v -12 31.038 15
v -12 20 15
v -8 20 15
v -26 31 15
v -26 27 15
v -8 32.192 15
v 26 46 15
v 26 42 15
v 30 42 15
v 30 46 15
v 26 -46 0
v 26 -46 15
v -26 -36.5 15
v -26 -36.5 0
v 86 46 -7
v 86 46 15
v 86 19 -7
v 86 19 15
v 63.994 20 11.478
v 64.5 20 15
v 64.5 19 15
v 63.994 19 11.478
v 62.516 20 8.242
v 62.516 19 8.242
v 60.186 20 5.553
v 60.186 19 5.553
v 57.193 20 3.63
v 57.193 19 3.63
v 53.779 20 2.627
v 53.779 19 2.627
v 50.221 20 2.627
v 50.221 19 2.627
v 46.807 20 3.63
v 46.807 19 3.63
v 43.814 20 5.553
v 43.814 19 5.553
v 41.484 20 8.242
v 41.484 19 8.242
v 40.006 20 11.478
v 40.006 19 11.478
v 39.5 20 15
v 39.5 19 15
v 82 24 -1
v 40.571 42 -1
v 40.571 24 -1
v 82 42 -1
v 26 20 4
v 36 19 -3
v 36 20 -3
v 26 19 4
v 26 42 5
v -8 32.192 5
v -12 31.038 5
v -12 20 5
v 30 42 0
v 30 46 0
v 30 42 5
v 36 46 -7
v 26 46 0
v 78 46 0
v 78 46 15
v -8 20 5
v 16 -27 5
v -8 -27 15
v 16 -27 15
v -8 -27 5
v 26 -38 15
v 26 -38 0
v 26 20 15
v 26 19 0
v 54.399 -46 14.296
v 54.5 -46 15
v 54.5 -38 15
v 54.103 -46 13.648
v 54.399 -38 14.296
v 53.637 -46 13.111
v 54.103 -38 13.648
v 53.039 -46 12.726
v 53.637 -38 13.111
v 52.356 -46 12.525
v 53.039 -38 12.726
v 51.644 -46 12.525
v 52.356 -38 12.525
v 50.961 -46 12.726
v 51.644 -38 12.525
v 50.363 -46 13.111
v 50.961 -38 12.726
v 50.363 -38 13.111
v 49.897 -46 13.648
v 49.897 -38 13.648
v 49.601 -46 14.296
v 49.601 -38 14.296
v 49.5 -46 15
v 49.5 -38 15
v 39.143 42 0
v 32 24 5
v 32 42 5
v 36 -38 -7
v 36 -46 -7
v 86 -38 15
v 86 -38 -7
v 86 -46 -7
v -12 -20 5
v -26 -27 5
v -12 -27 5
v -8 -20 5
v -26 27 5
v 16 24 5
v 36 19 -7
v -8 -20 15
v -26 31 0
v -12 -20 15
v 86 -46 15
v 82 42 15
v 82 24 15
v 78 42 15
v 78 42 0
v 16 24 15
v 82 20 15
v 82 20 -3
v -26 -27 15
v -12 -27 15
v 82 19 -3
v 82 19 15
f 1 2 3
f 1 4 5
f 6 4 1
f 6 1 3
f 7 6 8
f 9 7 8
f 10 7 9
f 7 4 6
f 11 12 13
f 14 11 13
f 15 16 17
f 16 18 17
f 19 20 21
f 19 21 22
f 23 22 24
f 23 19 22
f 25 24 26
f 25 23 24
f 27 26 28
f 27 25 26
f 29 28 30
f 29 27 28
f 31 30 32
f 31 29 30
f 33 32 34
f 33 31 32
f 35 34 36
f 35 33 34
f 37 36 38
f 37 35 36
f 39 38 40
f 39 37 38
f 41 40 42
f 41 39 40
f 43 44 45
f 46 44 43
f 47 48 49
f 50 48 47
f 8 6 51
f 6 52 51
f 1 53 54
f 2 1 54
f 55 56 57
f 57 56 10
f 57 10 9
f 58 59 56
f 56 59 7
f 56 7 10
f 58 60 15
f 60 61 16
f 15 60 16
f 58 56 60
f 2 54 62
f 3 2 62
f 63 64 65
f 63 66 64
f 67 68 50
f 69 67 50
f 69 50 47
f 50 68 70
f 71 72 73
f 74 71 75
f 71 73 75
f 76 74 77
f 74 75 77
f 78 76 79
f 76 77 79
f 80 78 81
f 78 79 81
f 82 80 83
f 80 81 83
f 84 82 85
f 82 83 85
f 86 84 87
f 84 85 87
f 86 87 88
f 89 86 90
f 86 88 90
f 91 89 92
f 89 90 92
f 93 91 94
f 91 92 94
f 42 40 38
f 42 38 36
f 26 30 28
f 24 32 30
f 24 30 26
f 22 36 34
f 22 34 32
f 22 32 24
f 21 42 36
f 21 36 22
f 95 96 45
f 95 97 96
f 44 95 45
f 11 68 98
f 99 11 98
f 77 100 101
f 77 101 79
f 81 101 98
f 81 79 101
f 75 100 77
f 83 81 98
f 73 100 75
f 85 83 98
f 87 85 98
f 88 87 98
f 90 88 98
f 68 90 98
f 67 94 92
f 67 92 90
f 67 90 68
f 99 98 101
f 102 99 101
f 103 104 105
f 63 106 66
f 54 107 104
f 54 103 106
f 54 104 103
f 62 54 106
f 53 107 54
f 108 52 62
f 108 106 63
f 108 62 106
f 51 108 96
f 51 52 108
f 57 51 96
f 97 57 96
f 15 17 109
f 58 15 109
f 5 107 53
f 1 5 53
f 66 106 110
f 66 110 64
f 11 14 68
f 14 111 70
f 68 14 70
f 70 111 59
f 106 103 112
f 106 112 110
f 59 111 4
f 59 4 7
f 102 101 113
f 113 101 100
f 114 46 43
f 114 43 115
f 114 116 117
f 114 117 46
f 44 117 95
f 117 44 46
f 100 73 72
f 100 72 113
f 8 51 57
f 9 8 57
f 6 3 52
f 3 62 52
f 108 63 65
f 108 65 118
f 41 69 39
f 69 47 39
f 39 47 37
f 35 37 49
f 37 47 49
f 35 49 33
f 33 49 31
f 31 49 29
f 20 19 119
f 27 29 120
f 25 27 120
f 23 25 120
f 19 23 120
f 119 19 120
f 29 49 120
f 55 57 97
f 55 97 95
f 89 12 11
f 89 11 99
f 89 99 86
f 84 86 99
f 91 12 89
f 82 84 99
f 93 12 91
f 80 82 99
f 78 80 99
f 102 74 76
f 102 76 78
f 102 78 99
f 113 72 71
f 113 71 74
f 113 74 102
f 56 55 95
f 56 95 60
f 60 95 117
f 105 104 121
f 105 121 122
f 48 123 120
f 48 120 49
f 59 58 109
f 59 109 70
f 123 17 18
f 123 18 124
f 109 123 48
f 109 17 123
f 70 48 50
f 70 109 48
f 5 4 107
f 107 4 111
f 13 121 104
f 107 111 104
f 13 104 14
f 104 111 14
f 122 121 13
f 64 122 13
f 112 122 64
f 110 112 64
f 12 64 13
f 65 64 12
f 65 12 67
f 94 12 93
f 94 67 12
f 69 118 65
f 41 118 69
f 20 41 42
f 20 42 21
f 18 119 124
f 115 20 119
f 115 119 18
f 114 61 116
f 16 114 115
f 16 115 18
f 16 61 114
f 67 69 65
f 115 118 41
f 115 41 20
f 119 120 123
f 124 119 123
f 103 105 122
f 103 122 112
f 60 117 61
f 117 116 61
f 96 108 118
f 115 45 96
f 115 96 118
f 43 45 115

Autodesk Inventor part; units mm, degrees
ref_plane "YZ Plane" through (0, 0, 0) normal (1, 0, 0) x (0, 1, 0)
ref_plane "XZ Plane" through (0, 0, 0) normal (0, 1, 0) x (-1, 0, 0)
ref_plane "XY Plane" through (0, 0, 0) normal (0, 0, 1) x (1, 0, 0)
sketch "Sketch1" plane through (0, 0, 0) normal (0, 0, 1) x (1, 0, 0)
  line L0 (-26, -31) -> (26, -31)
  line L1 (26, -31) -> (26, 31)
  line L2 (26, 31) -> (-26, 31)
  line L3 (-26, 31) -> (-26, -31)
  line L4 (-26, -31) -> (26, 31) construction
  line L5 (26, -31) -> (-26, 31) construction
  line L6 (-24, -23) -> (-24, -9) construction
  line L7 (-26, 31) -> (26, 46)
  line L8 (26, 46) -> (86, 46)
  line L9 (86, 46) -> (86, 19)
  line L10 (86, 19) -> (26, 19)
  point P0 (0, 0)
  dimension "d0" = 2
  dimension "d1" = 62
  dimension "d2" = 52
  dimension "d3" = 15
  dimension "d4" = 50
  dimension "d5" = 60
extrude "Extrusion1" add sketch "Sketch1" along normal blind 5
sketch "Sketch2" plane through (0, 0, 5) normal (0, 0, 1) x (1, 0, 0)
  line L0 (-29, 11.5) -> (-29, 6.5) construction
  line L1 (-29, 6.5) -> (-24, 6.5) construction
  line L2 (-24, 6.5) -> (-24, -20) construction
  line L3 (-24, -20) -> (-15, -20) construction
  line L4 (-15, -20) -> (-15, -27) construction
  line L5 (-15, -27) -> (-12, -27) construction
  line L6 (-12, -27) -> (-12, -20) construction
  line L7 (-12, -20) -> (16, -20) construction
  line L8 (16, -20) -> (16, 20) construction
  line L9 (16, 20) -> (11, 20) construction
  line L10 (11, 20) -> (11, 25) construction
  line L11 (11, 25) -> (8, 25) construction
  line L12 (8, 25) -> (8, 20) construction
  line L13 (8, 20) -> (-12, 20) construction
  line L14 (-12, 20) -> (-12, 27) construction
  line L15 (-12, 27) -> (-15, 27) construction
  line L16 (-15, 27) -> (-15, 20) construction
  line L17 (-15, 20) -> (-24, 20) construction
  line L18 (26, 46) -> (-26, 31) projected
  line L19 (-24, 20) -> (-24, 11.5) construction
  line L20 (-24, 11.5) -> (-29, 11.5) construction
  line L21 (-26, 31) -> (-26, -31) construction
  line L22 (-26, -31) -> (26, -31) construction
  line L23 (-12, 31.0385) -> (-12, 20)
  line L24 (-12, 20) -> (-8, 20)
  line L25 (-8, 20) -> (-8, 32.1923)
  line L26 (-26, 27) -> (26, 42)
  line L27 (-26, -27) -> (-12, -27)
  line L28 (-12, -27) -> (-12, -20)
  line L29 (-12, -20) -> (-8, -20)
  line L30 (-8, -20) -> (-8, -27)
  line L31 (-8, -27) -> (16, -27)
  line L32 (16, -27) -> (16, 20)
  line L33 (26, -31) -> (26, 19) projected
  line L34 (26, 24) -> (26, 19) construction
  line L35 (-26, 31) -> (-26, 27)
  line L36 (86, 46) -> (26, 46) projected
  line L37 (26, 46) -> (26, 42)
  line L38 (26, 42) -> (82, 42)
  line L39 (82, 42) -> (82, 19)
  line L40 (26, 19) -> (86, 19) projected
  line L41 (86, 19) -> (86, 46) projected
  line L42 (-26, -27) -> (-26, -31)
  line L43 (-26, -31) -> (26, -31)
  line L44 (16, 20) -> (16, 24)
  line L45 (16, 24) -> (26, 24)
  line L46 (26, 24) -> (82, 24)
  line L47 (26, 19) -> (26, 20)
  line L48 (26, 20) -> (82, 20)
  point P0 (0, 0)
  dimension "d8" = 3
  dimension "d9" = 3
  dimension "d10" = 3
  dimension "d11" = 7
  dimension "d12" = 54
  dimension "d13" = 7
  dimension "d14" = 5
  dimension "d15" = 5
  dimension "d16" = 2
  dimension "d17" = 9
  dimension "d18" = 8.5
  dimension "d19" = 4
  dimension "d20" = 5
  dimension "d21" = 5
  dimension "d22" = 40
  dimension "d23" = 4
  dimension "d25" = 4
  dimension "d26" = 10
  dimension "d27" = 4
  dimension "d28" = 4
  dimension "d36" = 1
  dimension "d37" = 4
extrude "Extrusion2" add sketch "Sketch2" along normal blind 10 contours L37 L26 L35 L18 | L36 L41 L40 L39 L38 L37 | L25 L24 L23 L26 | L39 L48 L47 L33 L43 L42 L27 L28 L29 L30 L31 L32 L44 L45 L46
sketch "Sketch3" plane through (0, 0, 15) normal (0, 0, 1) x (1, 0, 0)
  line L0 (-26, 27) -> (-12, 31.0385) projected
  line L1 (-12, 31.0385) -> (-12, 20) projected
  line L2 (-12, 20) -> (-8, 20) projected
  line L3 (-8, 20) -> (-8, 32.1923) projected
  line L4 (-8, 32.1923) -> (26, 42) projected
  line L5 (26, 42) -> (82, 42) projected
  line L6 (82, 42) -> (82, 24) projected
  line L7 (82, 19) -> (86, 19) projected
  line L8 (86, 19) -> (86, 46) projected
  line L9 (86, 46) -> (26, 46) projected
  line L10 (26, 46) -> (-26, 31) projected
  line L11 (-26, 31) -> (-26, 27) projected
  line L12 (30, 42) -> (78, 42)
  line L13 (78, 42) -> (78, 46)
  line L14 (78, 46) -> (30, 46)
  line L15 (30, 46) -> (30, 42)
  line L16 (82, 24) -> (16, 24) projected
  line L17 (16, 24) -> (16, -27) projected
  line L18 (16, -27) -> (-8, -27) projected
  line L19 (-8, -27) -> (-8, -20) projected
  line L20 (-8, -20) -> (-12, -20) projected
  line L21 (-12, -20) -> (-12, -27) projected
  line L22 (-12, -27) -> (-26, -27) projected
  line L23 (-26, -27) -> (-26, -31) projected
  line L24 (-26, -31) -> (26, -31) projected
  line L25 (26, -31) -> (26, 20) projected
  line L26 (26, 20) -> (82, 20) projected
  line L27 (82, 20) -> (82, 19) projected
  point P0 (0, 0)
  point P1 (30, 46)
  dimension "d31" = 4
  dimension "d32" = 4
extrude "Extrusion3" cut sketch "Sketch3" against normal through all contours L9 L13 L5 L15
sketch "Sketch4" plane through (26, 20, 5) normal (0, -1, 0) x (1, 0, 0)
  line L0 (0, 10) -> (56, 10) projected
  arc A0 (13.5, 10) -> (38.5, 10) centre (26, 10) ccw
  line L1 (0, -5) -> (0, 10) projected
  line L2 (13.5, 10) -> (38.5, 10)
  point P0 (-26, -5)
  dimension "d38" = 25
  dimension "d39" = 26
sketch "Sketch5" plane through (26, 19, 0) normal (0, -1, 0) x (1, 0, 0)
  line L0 (0, 0) -> (60, 0) projected
  line L1 (60, 0) -> (60, -7)
  line L2 (60, -7) -> (10, -7)
  line L3 (10, -7) -> (0, 0)
  point P0 (-26, 0)
  dimension "d40" = 50
  dimension "d41" = 7
extrude "Extrusion4" add sketch "Sketch5" against normal up to surface (27 mm away)
sketch "Sketch6" plane through (26, 19, 5) normal (0, -1, 0) x (1, 0, 0)
  line L0 (0, 0) -> (56, 0) projected
  line L1 (56, 0) -> (56, -8)
  line L2 (56, -8) -> (10, -8)
  line L3 (0, -5) -> (0, 10) projected
  line L4 (60, -12) -> (60, 10) projected
  line L5 (10, -12) -> (60, -12) projected
  line L6 (0, -5) -> (10, -12) projected
  line L7 (10, -8) -> (10, -12)
  line L8 (10, -8) -> (0, -1)
  point P0 (-26, -5)
  point P1 (35, -12)
  dimension "d44" = 4
  dimension "d45" = 4
  dimension "d47" = 4
extrude "Extrusion5" cut sketch "Sketch6" against normal up to surface (1 mm away) contours L0 L1 L2 L8 L3
extrude "Extrusion6" add sketch "Sketch4" along normal up to surface (1 mm away)
sketch "Sketch8" plane through (30, 42, 5) normal (0, 1, 0) x (1, 0, 0)
  line L0 (0, 5) -> (48, 5) projected
  line L1 (0, 0) -> (0, 5) projected
  line L2 (48, 0) -> (0, 0) projected
  line L3 (48, 0) -> (48, 5) projected
  line L4 (-14, 0) -> (52, 0) projected
  line L5 (2, 0) -> (10.5714, 6)
  line L6 (10.5714, 6) -> (48, 6)
  line L7 (48, 6) -> (48, 0)
  line L8 (2, 0) -> (48, 0)
  line L9 (-4, 5) -> (6, 12) projected
  line L10 (48, 6) -> (52, 6)
  line L11 (52, 6) -> (52, 0)
  line L12 (52, 0) -> (48, 0)
  line L13 (48, 0) -> (48, 6)
  point P0 (-30, 5)
  point P1 (9.1429, 5)
  point P2 (2, 0)
  dimension "d57" = 2
extrude "Extrusion8" cut sketch "Sketch8" against normal up to surface (18 mm away) contours L5 L6 L7 L0 | L0 L3 L2 L5 | L7 L10 L11 L4 L3
sketch "Sketch9" plane through (-26, -31, 0) normal (0, -1, 0) x (1, 0, 0)
  line L0 (62, -3) -> (52, 4) projected
  line L1 (52, 0) -> (52, 4) projected
  line L2 (52, 0) -> (62, -7) projected
  line L3 (62, -7) -> (112, -7) projected
  line L4 (112, -7) -> (112, 15) projected
  line L5 (108, 15) -> (112, 15) projected
  line L6 (108, 15) -> (108, -3) projected
  line L7 (108, -3) -> (62, -3) projected
  line L8 (52, 15) -> (65.5, 15) projected
  line L9 (65.5, 15) -> (90.5, 15) projected
  line L10 (90.5, 15) -> (108, 15) projected
  line L11 (0, 0) -> (52, 0) projected
  line L12 (52, 0) -> (52, 15) projected
  line L13 (0, 15) -> (52, 15) projected
  line L14 (0, 0) -> (0, 15) projected
  point P0 (26, 0)
extrude "Extrusion9" add sketch "Sketch9" along normal blind 15
sketch "Sketch10" plane through (0, 0, 15) normal (0, 0, 1) x (1, 0, 0)
  line L0 (26, -31) -> (86, -31)
  line L1 (86, -31) -> (86, -38)
  line L2 (86, -38) -> (26, -38)
  line L3 (26, -38) -> (26, -31)
  point P0 (0, 0)
  dimension "d62" = 7
extrude "Extrusion10" cut sketch "Sketch10" against normal through all
sketch "Sketch11" plane through (0, 0, 15) normal (0, 0, 1) x (1, 0, 0)
  line L0 (-26, -46) -> (26, -46) projected
  line L1 (26, -46) -> (-26, -46)
  line L2 (-26, -46) -> (-26, -36.5)
  line L3 (26, -46) -> (-26, -36.5)
  point P0 (0, 0)
  dimension "d65" = 9.5
extrude "Extrusion11" cut sketch "Sketch11" against normal through all
sketch "Sketch12" plane through (26, -38, 15) normal (0, 1, 0) x (1, 0, 0)
  arc A0 (38.5, 0) -> (13.5, 0) centre (26, 0) ccw projected
  line L0 (13.5, 0) -> (38.5, 0) projected
  circle A1 centre (26, 0) radius 2.5
  point P0 (-26, 15)
  dimension "d68" = 5
extrude "Extrusion12" cut sketch "Sketch12" against normal through all contours A1 L0 | L0 A1
equation "\"d45\" = d44"
properties part number "wirst 1 left"
